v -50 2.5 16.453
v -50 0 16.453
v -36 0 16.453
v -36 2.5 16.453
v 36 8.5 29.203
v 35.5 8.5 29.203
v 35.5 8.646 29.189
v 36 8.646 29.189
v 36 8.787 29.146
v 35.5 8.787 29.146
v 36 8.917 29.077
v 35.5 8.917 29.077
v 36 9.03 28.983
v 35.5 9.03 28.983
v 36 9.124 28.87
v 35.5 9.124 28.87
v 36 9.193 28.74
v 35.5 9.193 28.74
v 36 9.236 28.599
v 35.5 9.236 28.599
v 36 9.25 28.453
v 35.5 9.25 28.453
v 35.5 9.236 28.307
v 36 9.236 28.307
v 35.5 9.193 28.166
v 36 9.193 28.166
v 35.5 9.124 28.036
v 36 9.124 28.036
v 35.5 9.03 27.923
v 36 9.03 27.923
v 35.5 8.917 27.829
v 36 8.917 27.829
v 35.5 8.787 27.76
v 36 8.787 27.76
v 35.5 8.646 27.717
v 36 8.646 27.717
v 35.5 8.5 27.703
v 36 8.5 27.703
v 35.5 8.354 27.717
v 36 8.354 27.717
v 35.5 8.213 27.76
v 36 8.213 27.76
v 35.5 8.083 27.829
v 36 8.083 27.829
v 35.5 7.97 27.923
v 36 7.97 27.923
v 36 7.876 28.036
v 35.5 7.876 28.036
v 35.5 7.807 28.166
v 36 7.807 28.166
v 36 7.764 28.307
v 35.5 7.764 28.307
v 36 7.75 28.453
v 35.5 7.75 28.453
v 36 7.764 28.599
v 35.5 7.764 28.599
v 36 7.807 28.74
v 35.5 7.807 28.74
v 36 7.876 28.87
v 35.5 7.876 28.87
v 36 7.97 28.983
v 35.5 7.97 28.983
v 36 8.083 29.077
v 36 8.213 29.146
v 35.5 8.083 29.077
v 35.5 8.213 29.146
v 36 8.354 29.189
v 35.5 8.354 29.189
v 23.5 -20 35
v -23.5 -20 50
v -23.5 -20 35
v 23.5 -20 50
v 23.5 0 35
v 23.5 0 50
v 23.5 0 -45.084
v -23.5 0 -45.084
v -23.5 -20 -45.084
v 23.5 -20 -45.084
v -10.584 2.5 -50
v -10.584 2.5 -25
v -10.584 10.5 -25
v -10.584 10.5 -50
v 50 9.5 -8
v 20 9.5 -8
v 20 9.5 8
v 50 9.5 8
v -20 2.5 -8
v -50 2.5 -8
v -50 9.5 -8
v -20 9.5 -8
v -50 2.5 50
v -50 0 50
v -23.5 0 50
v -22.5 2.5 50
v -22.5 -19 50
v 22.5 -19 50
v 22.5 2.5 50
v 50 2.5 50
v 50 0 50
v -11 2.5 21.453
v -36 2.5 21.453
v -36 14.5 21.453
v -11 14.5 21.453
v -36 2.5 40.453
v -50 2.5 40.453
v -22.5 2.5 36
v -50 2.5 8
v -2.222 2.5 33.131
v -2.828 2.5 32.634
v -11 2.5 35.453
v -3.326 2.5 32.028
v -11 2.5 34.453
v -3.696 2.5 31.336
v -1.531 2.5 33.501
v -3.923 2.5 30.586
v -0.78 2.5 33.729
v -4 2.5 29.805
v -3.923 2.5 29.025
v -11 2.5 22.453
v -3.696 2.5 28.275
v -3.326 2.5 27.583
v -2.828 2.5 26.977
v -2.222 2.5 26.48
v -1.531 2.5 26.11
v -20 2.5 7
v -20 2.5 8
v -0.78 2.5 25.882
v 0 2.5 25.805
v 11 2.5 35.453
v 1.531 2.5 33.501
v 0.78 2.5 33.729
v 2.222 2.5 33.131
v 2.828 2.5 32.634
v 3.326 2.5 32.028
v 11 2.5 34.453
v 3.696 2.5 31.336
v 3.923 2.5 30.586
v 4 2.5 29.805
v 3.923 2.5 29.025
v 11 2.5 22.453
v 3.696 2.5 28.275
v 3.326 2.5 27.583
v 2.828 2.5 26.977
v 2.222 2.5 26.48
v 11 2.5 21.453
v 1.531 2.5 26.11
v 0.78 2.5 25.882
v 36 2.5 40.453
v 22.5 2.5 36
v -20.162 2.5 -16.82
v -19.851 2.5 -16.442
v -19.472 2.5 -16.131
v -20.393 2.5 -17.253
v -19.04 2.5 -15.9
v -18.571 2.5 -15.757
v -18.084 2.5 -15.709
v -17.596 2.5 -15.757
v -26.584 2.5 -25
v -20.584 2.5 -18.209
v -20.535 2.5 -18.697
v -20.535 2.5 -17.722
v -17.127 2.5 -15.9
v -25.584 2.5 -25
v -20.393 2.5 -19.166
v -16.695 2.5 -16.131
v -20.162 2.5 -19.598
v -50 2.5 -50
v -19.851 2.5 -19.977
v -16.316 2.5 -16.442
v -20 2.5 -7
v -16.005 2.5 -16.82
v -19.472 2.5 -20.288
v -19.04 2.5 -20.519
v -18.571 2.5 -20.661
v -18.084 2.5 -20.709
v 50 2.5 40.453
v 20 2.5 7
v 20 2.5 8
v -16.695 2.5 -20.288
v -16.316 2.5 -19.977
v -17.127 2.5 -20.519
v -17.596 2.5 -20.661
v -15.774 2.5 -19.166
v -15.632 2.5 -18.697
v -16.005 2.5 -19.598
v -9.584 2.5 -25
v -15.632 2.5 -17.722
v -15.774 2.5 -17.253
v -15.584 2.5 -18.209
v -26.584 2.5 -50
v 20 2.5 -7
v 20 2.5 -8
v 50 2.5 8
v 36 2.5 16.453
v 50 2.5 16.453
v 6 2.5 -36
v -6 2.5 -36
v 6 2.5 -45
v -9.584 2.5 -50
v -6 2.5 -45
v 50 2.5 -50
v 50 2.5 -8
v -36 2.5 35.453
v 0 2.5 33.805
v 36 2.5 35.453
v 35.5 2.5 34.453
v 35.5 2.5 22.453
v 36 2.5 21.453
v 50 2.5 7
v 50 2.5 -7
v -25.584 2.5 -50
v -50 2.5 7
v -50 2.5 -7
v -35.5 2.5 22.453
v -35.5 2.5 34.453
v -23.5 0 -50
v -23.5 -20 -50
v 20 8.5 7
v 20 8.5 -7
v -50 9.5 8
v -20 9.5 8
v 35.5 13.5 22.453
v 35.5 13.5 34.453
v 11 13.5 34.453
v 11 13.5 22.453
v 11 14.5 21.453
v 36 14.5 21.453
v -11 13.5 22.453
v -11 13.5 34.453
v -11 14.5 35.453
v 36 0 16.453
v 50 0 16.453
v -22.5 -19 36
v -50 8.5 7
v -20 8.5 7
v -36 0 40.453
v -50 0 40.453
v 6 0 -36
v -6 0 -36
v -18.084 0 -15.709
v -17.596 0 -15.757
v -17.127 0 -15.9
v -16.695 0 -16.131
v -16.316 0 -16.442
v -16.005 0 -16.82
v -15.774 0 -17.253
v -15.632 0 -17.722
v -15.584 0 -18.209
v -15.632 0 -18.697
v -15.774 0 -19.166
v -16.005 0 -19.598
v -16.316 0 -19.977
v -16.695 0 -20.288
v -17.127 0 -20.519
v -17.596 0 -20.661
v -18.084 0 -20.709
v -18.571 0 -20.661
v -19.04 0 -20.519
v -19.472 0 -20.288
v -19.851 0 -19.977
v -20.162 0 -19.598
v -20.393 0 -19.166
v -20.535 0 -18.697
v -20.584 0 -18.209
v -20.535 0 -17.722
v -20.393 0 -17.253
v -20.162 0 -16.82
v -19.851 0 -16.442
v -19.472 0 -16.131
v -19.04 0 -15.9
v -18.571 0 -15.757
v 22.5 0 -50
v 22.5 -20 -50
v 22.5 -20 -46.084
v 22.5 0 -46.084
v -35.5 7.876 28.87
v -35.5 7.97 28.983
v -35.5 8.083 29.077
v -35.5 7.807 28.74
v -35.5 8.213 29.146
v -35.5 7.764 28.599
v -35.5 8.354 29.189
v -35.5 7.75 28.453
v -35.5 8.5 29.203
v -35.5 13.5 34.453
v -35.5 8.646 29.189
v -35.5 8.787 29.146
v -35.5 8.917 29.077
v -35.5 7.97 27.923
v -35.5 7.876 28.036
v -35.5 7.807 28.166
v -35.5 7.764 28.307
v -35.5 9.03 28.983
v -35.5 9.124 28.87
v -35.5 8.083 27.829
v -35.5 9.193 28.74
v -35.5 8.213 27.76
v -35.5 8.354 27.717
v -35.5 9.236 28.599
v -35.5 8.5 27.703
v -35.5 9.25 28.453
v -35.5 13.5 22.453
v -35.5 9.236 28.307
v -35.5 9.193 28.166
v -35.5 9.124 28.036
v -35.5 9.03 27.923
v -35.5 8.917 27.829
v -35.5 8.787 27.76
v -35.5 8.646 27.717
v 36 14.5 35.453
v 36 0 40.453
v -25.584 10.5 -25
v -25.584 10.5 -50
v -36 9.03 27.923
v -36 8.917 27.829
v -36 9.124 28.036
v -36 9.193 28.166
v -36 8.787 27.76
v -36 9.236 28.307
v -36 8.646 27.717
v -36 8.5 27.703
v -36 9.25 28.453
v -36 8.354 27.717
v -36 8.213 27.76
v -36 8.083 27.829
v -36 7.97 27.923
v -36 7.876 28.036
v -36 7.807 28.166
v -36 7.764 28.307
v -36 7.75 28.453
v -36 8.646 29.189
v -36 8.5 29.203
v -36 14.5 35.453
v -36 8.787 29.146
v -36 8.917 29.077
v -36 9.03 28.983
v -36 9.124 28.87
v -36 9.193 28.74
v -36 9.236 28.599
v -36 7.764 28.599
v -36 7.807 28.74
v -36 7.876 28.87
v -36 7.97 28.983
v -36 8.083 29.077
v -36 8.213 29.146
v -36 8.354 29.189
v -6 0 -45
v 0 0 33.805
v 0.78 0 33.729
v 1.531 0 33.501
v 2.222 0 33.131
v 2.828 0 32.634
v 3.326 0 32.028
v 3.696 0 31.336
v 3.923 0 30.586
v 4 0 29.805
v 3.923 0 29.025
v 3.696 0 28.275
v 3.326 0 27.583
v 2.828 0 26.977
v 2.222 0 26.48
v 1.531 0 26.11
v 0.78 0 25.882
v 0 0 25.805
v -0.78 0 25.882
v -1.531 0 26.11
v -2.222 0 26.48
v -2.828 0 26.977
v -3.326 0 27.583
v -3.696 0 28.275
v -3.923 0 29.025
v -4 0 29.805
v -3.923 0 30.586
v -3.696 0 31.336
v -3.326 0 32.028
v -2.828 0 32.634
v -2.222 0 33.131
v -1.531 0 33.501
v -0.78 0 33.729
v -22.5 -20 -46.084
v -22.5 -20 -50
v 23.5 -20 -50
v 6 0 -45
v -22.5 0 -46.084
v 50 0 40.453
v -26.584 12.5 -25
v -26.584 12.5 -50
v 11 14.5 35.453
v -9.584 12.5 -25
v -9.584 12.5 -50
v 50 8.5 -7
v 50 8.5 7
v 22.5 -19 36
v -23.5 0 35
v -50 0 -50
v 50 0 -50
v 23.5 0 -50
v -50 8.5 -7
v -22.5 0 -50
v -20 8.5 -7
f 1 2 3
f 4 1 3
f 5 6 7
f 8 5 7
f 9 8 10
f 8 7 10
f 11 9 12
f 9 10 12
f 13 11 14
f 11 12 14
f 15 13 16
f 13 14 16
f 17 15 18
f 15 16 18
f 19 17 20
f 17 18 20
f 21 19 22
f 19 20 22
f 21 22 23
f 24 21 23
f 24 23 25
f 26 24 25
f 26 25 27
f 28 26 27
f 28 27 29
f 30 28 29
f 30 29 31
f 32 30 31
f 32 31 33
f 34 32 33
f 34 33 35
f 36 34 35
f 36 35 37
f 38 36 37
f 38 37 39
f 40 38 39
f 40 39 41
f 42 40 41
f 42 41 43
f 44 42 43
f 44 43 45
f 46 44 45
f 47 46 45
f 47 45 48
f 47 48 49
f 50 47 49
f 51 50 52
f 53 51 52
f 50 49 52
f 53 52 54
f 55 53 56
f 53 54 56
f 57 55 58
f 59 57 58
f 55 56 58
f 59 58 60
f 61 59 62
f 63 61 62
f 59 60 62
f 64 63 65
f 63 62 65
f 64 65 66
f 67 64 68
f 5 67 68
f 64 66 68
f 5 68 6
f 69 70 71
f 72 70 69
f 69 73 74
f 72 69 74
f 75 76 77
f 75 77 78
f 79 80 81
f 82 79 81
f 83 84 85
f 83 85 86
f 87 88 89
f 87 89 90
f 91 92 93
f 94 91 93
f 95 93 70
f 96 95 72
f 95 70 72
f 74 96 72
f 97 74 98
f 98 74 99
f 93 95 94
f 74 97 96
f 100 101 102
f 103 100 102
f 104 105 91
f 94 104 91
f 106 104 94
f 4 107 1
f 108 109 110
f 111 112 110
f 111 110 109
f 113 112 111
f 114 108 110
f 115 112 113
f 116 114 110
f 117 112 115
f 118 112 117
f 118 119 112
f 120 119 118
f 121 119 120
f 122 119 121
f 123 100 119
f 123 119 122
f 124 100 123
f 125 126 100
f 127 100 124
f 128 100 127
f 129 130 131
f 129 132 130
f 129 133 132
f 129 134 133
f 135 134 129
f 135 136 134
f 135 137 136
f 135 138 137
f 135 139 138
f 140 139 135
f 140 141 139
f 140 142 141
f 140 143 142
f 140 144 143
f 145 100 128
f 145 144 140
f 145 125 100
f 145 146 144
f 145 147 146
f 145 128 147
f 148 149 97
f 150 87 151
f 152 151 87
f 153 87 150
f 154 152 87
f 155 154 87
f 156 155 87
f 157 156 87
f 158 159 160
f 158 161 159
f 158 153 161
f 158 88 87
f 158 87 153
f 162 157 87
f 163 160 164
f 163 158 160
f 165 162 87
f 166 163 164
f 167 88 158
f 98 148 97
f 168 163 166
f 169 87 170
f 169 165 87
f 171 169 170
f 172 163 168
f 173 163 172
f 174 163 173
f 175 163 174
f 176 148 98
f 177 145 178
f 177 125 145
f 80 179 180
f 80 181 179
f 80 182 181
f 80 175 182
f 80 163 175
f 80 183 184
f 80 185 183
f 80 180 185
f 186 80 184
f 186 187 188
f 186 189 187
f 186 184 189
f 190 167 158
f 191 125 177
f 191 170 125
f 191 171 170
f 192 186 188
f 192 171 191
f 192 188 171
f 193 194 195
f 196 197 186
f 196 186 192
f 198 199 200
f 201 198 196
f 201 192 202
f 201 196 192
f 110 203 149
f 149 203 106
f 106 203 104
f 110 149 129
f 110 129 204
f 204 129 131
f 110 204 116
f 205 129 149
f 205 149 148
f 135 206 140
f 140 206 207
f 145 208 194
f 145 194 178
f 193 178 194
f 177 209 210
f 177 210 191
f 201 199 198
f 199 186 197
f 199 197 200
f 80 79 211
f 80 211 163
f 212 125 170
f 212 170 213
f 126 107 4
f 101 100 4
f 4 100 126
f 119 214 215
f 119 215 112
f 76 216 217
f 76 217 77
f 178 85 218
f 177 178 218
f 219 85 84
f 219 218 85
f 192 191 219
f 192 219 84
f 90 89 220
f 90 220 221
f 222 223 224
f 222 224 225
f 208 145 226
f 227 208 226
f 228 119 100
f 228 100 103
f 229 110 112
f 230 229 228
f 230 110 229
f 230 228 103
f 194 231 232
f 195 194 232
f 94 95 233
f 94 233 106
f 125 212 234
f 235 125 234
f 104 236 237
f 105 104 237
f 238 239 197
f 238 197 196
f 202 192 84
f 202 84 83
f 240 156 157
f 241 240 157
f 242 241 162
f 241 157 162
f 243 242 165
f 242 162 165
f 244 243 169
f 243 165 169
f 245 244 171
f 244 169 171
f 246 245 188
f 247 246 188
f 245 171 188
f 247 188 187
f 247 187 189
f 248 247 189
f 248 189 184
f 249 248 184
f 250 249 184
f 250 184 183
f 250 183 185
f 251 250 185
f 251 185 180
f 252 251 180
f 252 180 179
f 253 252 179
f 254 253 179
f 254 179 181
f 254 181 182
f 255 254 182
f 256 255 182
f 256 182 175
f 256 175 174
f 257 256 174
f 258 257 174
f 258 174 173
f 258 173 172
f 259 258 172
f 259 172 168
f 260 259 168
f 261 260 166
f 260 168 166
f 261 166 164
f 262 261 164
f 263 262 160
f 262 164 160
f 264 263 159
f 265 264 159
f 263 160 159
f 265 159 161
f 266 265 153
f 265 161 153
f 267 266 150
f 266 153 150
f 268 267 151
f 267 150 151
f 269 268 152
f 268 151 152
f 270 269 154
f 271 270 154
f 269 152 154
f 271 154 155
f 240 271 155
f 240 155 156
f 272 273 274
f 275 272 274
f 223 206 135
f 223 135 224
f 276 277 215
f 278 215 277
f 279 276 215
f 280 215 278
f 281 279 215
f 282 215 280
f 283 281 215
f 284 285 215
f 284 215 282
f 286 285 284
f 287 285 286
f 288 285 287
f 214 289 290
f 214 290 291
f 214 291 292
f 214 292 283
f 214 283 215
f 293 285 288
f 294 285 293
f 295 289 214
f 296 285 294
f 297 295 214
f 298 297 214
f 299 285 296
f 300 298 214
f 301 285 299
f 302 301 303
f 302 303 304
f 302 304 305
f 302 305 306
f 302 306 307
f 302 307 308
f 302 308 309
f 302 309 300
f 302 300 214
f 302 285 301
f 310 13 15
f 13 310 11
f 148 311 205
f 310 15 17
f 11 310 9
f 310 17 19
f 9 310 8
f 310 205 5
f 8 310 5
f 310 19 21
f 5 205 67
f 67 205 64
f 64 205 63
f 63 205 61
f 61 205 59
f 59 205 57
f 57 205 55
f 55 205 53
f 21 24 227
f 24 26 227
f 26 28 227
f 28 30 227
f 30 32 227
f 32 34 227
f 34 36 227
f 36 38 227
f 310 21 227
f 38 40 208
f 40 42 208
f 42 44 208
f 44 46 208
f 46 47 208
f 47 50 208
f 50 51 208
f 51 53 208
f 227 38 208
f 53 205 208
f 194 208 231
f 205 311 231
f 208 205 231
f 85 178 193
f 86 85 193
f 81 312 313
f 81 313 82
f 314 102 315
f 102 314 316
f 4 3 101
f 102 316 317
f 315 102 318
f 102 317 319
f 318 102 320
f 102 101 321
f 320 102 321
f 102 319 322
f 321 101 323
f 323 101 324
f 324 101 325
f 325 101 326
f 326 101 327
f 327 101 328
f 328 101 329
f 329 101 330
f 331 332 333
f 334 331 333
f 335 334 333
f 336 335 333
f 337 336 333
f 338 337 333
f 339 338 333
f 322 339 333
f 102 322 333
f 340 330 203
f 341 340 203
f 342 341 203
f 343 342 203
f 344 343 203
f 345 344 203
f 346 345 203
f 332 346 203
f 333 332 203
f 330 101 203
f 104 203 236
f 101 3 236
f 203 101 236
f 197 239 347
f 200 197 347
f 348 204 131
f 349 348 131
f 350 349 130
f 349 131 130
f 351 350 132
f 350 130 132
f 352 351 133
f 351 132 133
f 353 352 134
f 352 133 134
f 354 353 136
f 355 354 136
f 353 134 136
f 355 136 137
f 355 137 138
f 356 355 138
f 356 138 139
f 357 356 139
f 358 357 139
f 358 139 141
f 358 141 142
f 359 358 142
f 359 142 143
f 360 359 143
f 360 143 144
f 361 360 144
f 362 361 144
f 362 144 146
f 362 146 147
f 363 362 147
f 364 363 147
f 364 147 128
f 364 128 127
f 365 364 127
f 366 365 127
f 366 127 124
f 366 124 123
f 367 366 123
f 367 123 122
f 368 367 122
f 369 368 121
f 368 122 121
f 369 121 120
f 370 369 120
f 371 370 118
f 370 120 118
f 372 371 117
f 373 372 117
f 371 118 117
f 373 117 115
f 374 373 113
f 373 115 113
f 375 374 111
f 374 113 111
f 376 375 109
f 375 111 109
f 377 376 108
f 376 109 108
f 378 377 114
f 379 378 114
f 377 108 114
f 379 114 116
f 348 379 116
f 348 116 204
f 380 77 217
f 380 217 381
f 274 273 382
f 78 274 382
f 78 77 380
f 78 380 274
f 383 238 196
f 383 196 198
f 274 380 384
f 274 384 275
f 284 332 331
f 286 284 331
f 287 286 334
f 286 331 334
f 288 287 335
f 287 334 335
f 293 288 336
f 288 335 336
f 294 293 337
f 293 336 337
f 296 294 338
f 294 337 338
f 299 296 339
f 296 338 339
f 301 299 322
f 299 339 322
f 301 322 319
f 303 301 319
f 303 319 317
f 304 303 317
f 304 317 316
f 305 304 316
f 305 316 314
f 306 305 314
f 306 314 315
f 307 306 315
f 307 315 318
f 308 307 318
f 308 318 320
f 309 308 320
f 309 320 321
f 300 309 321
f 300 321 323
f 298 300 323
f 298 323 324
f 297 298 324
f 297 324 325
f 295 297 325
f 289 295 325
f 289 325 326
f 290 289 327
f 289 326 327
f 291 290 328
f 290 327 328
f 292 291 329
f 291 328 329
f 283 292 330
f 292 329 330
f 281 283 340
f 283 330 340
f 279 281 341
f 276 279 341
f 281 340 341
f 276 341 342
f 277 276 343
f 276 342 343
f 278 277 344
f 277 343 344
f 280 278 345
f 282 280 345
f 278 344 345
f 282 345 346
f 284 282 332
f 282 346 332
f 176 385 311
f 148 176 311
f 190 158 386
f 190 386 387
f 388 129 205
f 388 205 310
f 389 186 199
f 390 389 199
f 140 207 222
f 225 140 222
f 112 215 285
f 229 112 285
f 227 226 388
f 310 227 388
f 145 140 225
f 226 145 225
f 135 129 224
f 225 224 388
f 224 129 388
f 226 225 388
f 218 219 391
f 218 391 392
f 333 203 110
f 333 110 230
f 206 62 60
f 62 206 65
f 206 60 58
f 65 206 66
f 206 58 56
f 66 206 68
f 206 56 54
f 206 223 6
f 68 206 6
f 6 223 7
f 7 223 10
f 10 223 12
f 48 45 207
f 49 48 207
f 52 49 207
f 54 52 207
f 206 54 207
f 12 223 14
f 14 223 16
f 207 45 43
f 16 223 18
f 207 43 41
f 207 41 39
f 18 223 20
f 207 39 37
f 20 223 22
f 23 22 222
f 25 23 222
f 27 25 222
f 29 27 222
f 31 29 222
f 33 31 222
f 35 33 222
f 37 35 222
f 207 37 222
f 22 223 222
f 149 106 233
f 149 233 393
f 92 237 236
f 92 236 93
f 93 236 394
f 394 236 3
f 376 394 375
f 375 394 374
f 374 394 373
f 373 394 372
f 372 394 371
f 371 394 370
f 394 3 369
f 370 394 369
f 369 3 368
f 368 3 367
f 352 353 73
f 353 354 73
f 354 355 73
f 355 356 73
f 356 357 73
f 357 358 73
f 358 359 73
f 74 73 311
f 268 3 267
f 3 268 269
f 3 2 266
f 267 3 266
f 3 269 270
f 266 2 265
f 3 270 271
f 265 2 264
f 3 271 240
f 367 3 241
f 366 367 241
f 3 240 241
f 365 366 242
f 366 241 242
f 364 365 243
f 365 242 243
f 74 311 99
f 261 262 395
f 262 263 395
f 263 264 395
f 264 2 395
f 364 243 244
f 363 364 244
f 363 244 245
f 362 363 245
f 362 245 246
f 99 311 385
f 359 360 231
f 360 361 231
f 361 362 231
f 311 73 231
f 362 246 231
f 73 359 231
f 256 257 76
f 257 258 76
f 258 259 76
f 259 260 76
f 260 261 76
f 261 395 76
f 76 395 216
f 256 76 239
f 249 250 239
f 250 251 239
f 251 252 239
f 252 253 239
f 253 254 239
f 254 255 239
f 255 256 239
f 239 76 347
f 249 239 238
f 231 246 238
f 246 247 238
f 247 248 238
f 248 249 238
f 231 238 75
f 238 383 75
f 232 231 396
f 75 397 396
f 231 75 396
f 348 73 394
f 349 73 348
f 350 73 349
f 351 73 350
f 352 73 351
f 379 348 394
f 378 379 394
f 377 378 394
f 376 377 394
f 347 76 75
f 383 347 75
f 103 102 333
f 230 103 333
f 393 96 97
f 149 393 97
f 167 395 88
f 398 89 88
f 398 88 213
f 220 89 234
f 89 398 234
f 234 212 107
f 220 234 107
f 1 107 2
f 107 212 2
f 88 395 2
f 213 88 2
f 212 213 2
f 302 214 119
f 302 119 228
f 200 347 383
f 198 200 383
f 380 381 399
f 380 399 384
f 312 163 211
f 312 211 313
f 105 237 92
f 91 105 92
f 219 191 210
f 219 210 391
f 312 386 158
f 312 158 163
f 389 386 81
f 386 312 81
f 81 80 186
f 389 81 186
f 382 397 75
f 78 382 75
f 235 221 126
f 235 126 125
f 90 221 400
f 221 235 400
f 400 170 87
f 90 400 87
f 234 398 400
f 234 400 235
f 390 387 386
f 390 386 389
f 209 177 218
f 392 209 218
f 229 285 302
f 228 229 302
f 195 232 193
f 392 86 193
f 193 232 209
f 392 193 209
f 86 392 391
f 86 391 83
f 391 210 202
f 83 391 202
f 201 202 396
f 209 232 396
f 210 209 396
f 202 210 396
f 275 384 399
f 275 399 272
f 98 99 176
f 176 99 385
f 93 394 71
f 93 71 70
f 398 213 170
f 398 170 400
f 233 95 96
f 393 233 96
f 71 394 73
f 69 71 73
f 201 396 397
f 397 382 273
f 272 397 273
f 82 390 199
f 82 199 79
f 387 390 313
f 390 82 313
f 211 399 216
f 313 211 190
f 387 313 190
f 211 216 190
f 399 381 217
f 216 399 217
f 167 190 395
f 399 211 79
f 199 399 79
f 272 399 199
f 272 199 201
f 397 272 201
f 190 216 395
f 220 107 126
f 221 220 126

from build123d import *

# Parameters (mm, degrees)
SKETCH1_W                = 12
SKETCH1_H                = 9
BOSS_EXTRUDE1_DEPTH      = 2.5
SKETCH2_W                = 17
SKETCH2_H                = 25
BOSS_EXTRUDE2_DEPTH      = 10
SKETCH4_W                = 15
SKETCH4_H                = 8
CUT_EXTRUDE1_DEPTH       = 42
SKETCH7_W                = 14
SKETCH7_H                = 12
BOSS_EXTRUDE3_DEPTH      = 72
SKETCH8_R                = 0.75
CUT_EXTRUDE2_DEPTH       = 72
SKETCH9_W                = 22
SKETCH9_H                = 12
CUT_EXTRUDE3_DEPTH       = 37
SKETCH5_R                = 2.5
CUT_EXTRUDE6_DEPTH       = 23.5
SKETCH12_W               = 47
SKETCH12_H               = 15
BOSS_EXTRUDE4_DEPTH      = 20
SKETCH13_W               = 45
SKETCH13_H               = 21.5
CUT_EXTRUDE7_DEPTH       = 14
SKETCH14_W               = 47
SKETCH14_H               = 4.916428424
BOSS_EXTRUDE5_DEPTH      = 20
SKETCH15_W               = 45
SKETCH15_H               = 3.916428424
CUT_EXTRUDE8_DEPTH       = 20
SKETCH16_W               = 30
SKETCH16_H               = 16
BOSS_EXTRUDE6_DEPTH      = 7
SKETCH17_W               = 14
SKETCH17_H               = 6
CUT_EXTRUDE9_DEPTH       = 100
CUT_EXTRUDE10_DEPTH      = 46.5
CUT_EXTRUDE10_DEPTH_BACK = 24.5
SKETCH19_W               = 12
SKETCH19_H               = 11
SKETCH21_R               = 4
CUT_EXTRUDE11_DEPTH      = 24.5


with BuildPart() as part:
    # Sketch1 → Boss-Extrude1 (new body)
    with BuildSketch(Plane(origin=(0, 0, 0), x_dir=(1, 0, 0), z_dir=(0, 1, 0))):
        Polygon((-50, -40.45305067), (-50, -50), (50, -50), (50, -40.45305067), (36, -40.45305067), (36, -16.45305067), (50, -16.45305067), (50, 50), (-50, 50), (-50, -16.45305067), (-36, -16.45305067), (-36, -40.45305067), align=None)
        with Locations((0, 40.5)):
            Rectangle(SKETCH1_W, SKETCH1_H, mode=Mode.SUBTRACT)
    extrude(amount=BOSS_EXTRUDE1_DEPTH)

    # Sketch2 → Boss-Extrude2 (add)
    with BuildSketch(Plane(origin=(0, 2.5, 0), x_dir=(1, 0, 0), z_dir=(0, 1, 0))):
        with Locations((-18.083526834, 37.5)):
            Rectangle(SKETCH2_W, SKETCH2_H)
    extrude(amount=BOSS_EXTRUDE2_DEPTH)

    # Sketch4 → Cut-Extrude1 (cut)
    with BuildSketch(Plane.XY.offset(-25)):
        with Locations((-18.083526834, 6.5)):
            Rectangle(SKETCH4_W, SKETCH4_H)
    extrude(amount=-CUT_EXTRUDE1_DEPTH, mode=Mode.SUBTRACT)

    # Sketch7 → Boss-Extrude3 (add)
    with BuildSketch(Plane.ZY.offset(36)):
        with Locations((28.45305067, 8.5)):
            Rectangle(SKETCH7_W, SKETCH7_H)
    extrude(amount=-BOSS_EXTRUDE3_DEPTH)

    # Sketch8 → Cut-Extrude2 (cut)
    with BuildSketch(Plane.ZY.offset(36)):
        with Locations((28.45305067, 8.5)):
            Circle(SKETCH8_R)
    extrude(amount=-CUT_EXTRUDE2_DEPTH, mode=Mode.SUBTRACT)

    # Sketch9 → Cut-Extrude3 (cut)
    with BuildSketch(Plane.XY.offset(35.45305067)):
        with Locations((0, 8.5)):
            Rectangle(SKETCH9_W, SKETCH9_H)
    extrude(amount=-CUT_EXTRUDE3_DEPTH, mode=Mode.SUBTRACT)

    # Sketch5 → Cut-Extrude6 (cut)
    with BuildSketch(Plane(origin=(0, 2.5, 0), x_dir=(1, 0, 0), z_dir=(0, 1, 0))):
        with Locations(Location((-18.083526834, 18.209316503, 0), (0, 0, 270))):
            Circle(SKETCH5_R)
    extrude(amount=-CUT_EXTRUDE6_DEPTH, mode=Mode.SUBTRACT)

    # Sketch12 → Boss-Extrude4 (add)
    with BuildSketch(Plane.XZ):
        with Locations((0, 42.5)):
            Rectangle(SKETCH12_W, SKETCH12_H)
    extrude(amount=BOSS_EXTRUDE4_DEPTH)

    # Sketch13 → Cut-Extrude7 (cut)
    with BuildSketch(Plane.XY.offset(50)):
        with Locations((0, -8.25)):
            Rectangle(SKETCH13_W, SKETCH13_H)
    extrude(amount=-CUT_EXTRUDE7_DEPTH, mode=Mode.SUBTRACT)

    # Sketch14 → Boss-Extrude5 (add)
    with BuildSketch(Plane.XZ):
        with Locations((0, -47.541785788)):
            Rectangle(SKETCH14_W, SKETCH14_H)
    extrude(amount=BOSS_EXTRUDE5_DEPTH)

    # Sketch15 → Cut-Extrude8 (cut)
    with BuildSketch(Plane.XZ.offset(20)):
        with Locations((0, -48.041785788)):
            Rectangle(SKETCH15_W, SKETCH15_H)
    extrude(amount=-CUT_EXTRUDE8_DEPTH, mode=Mode.SUBTRACT)

    # Sketch16 → Boss-Extrude6 (add)
    with BuildSketch(Plane(origin=(0, 2.5, 0), x_dir=(1, 0, 0), z_dir=(0, 1, 0))):
        with Locations((-35, 0)):
            Rectangle(SKETCH16_W, SKETCH16_H)
        with Locations((35, 0)):
            Rectangle(SKETCH16_W, SKETCH16_H)
    extrude(amount=BOSS_EXTRUDE6_DEPTH)

    # Sketch17 → Cut-Extrude9 (cut)
    with BuildSketch(Plane.ZY.offset(50)):
        with Locations((0, 5.5)):
            Rectangle(SKETCH17_W, SKETCH17_H)
    extrude(amount=-CUT_EXTRUDE9_DEPTH, mode=Mode.SUBTRACT)

    # Sketch19 → Cut-Extrude10 (cut, two sides: drawn at the far end of the back side and taken through both)
    with BuildSketch(Plane(origin=(-11, 0, 0), x_dir=(0, 0, -1), z_dir=(1, 0, 0)).offset(-CUT_EXTRUDE10_DEPTH_BACK)):
        with Locations((-28.45305067, 8)):
            Rectangle(SKETCH19_W, SKETCH19_H)
    extrude(amount=CUT_EXTRUDE10_DEPTH + CUT_EXTRUDE10_DEPTH_BACK, mode=Mode.SUBTRACT)

    # Sketch21 → Cut-Extrude11 (cut)
    with BuildSketch(Plane(origin=(0, 2.5, 0), x_dir=(1, 0, 0), z_dir=(0, 1, 0))):
        with Locations(Location((0, -29.805394333, 0), (0, 0, 270))):
            Circle(SKETCH21_R)
    extrude(amount=-CUT_EXTRUDE11_DEPTH, mode=Mode.SUBTRACT)


solid = part.part
